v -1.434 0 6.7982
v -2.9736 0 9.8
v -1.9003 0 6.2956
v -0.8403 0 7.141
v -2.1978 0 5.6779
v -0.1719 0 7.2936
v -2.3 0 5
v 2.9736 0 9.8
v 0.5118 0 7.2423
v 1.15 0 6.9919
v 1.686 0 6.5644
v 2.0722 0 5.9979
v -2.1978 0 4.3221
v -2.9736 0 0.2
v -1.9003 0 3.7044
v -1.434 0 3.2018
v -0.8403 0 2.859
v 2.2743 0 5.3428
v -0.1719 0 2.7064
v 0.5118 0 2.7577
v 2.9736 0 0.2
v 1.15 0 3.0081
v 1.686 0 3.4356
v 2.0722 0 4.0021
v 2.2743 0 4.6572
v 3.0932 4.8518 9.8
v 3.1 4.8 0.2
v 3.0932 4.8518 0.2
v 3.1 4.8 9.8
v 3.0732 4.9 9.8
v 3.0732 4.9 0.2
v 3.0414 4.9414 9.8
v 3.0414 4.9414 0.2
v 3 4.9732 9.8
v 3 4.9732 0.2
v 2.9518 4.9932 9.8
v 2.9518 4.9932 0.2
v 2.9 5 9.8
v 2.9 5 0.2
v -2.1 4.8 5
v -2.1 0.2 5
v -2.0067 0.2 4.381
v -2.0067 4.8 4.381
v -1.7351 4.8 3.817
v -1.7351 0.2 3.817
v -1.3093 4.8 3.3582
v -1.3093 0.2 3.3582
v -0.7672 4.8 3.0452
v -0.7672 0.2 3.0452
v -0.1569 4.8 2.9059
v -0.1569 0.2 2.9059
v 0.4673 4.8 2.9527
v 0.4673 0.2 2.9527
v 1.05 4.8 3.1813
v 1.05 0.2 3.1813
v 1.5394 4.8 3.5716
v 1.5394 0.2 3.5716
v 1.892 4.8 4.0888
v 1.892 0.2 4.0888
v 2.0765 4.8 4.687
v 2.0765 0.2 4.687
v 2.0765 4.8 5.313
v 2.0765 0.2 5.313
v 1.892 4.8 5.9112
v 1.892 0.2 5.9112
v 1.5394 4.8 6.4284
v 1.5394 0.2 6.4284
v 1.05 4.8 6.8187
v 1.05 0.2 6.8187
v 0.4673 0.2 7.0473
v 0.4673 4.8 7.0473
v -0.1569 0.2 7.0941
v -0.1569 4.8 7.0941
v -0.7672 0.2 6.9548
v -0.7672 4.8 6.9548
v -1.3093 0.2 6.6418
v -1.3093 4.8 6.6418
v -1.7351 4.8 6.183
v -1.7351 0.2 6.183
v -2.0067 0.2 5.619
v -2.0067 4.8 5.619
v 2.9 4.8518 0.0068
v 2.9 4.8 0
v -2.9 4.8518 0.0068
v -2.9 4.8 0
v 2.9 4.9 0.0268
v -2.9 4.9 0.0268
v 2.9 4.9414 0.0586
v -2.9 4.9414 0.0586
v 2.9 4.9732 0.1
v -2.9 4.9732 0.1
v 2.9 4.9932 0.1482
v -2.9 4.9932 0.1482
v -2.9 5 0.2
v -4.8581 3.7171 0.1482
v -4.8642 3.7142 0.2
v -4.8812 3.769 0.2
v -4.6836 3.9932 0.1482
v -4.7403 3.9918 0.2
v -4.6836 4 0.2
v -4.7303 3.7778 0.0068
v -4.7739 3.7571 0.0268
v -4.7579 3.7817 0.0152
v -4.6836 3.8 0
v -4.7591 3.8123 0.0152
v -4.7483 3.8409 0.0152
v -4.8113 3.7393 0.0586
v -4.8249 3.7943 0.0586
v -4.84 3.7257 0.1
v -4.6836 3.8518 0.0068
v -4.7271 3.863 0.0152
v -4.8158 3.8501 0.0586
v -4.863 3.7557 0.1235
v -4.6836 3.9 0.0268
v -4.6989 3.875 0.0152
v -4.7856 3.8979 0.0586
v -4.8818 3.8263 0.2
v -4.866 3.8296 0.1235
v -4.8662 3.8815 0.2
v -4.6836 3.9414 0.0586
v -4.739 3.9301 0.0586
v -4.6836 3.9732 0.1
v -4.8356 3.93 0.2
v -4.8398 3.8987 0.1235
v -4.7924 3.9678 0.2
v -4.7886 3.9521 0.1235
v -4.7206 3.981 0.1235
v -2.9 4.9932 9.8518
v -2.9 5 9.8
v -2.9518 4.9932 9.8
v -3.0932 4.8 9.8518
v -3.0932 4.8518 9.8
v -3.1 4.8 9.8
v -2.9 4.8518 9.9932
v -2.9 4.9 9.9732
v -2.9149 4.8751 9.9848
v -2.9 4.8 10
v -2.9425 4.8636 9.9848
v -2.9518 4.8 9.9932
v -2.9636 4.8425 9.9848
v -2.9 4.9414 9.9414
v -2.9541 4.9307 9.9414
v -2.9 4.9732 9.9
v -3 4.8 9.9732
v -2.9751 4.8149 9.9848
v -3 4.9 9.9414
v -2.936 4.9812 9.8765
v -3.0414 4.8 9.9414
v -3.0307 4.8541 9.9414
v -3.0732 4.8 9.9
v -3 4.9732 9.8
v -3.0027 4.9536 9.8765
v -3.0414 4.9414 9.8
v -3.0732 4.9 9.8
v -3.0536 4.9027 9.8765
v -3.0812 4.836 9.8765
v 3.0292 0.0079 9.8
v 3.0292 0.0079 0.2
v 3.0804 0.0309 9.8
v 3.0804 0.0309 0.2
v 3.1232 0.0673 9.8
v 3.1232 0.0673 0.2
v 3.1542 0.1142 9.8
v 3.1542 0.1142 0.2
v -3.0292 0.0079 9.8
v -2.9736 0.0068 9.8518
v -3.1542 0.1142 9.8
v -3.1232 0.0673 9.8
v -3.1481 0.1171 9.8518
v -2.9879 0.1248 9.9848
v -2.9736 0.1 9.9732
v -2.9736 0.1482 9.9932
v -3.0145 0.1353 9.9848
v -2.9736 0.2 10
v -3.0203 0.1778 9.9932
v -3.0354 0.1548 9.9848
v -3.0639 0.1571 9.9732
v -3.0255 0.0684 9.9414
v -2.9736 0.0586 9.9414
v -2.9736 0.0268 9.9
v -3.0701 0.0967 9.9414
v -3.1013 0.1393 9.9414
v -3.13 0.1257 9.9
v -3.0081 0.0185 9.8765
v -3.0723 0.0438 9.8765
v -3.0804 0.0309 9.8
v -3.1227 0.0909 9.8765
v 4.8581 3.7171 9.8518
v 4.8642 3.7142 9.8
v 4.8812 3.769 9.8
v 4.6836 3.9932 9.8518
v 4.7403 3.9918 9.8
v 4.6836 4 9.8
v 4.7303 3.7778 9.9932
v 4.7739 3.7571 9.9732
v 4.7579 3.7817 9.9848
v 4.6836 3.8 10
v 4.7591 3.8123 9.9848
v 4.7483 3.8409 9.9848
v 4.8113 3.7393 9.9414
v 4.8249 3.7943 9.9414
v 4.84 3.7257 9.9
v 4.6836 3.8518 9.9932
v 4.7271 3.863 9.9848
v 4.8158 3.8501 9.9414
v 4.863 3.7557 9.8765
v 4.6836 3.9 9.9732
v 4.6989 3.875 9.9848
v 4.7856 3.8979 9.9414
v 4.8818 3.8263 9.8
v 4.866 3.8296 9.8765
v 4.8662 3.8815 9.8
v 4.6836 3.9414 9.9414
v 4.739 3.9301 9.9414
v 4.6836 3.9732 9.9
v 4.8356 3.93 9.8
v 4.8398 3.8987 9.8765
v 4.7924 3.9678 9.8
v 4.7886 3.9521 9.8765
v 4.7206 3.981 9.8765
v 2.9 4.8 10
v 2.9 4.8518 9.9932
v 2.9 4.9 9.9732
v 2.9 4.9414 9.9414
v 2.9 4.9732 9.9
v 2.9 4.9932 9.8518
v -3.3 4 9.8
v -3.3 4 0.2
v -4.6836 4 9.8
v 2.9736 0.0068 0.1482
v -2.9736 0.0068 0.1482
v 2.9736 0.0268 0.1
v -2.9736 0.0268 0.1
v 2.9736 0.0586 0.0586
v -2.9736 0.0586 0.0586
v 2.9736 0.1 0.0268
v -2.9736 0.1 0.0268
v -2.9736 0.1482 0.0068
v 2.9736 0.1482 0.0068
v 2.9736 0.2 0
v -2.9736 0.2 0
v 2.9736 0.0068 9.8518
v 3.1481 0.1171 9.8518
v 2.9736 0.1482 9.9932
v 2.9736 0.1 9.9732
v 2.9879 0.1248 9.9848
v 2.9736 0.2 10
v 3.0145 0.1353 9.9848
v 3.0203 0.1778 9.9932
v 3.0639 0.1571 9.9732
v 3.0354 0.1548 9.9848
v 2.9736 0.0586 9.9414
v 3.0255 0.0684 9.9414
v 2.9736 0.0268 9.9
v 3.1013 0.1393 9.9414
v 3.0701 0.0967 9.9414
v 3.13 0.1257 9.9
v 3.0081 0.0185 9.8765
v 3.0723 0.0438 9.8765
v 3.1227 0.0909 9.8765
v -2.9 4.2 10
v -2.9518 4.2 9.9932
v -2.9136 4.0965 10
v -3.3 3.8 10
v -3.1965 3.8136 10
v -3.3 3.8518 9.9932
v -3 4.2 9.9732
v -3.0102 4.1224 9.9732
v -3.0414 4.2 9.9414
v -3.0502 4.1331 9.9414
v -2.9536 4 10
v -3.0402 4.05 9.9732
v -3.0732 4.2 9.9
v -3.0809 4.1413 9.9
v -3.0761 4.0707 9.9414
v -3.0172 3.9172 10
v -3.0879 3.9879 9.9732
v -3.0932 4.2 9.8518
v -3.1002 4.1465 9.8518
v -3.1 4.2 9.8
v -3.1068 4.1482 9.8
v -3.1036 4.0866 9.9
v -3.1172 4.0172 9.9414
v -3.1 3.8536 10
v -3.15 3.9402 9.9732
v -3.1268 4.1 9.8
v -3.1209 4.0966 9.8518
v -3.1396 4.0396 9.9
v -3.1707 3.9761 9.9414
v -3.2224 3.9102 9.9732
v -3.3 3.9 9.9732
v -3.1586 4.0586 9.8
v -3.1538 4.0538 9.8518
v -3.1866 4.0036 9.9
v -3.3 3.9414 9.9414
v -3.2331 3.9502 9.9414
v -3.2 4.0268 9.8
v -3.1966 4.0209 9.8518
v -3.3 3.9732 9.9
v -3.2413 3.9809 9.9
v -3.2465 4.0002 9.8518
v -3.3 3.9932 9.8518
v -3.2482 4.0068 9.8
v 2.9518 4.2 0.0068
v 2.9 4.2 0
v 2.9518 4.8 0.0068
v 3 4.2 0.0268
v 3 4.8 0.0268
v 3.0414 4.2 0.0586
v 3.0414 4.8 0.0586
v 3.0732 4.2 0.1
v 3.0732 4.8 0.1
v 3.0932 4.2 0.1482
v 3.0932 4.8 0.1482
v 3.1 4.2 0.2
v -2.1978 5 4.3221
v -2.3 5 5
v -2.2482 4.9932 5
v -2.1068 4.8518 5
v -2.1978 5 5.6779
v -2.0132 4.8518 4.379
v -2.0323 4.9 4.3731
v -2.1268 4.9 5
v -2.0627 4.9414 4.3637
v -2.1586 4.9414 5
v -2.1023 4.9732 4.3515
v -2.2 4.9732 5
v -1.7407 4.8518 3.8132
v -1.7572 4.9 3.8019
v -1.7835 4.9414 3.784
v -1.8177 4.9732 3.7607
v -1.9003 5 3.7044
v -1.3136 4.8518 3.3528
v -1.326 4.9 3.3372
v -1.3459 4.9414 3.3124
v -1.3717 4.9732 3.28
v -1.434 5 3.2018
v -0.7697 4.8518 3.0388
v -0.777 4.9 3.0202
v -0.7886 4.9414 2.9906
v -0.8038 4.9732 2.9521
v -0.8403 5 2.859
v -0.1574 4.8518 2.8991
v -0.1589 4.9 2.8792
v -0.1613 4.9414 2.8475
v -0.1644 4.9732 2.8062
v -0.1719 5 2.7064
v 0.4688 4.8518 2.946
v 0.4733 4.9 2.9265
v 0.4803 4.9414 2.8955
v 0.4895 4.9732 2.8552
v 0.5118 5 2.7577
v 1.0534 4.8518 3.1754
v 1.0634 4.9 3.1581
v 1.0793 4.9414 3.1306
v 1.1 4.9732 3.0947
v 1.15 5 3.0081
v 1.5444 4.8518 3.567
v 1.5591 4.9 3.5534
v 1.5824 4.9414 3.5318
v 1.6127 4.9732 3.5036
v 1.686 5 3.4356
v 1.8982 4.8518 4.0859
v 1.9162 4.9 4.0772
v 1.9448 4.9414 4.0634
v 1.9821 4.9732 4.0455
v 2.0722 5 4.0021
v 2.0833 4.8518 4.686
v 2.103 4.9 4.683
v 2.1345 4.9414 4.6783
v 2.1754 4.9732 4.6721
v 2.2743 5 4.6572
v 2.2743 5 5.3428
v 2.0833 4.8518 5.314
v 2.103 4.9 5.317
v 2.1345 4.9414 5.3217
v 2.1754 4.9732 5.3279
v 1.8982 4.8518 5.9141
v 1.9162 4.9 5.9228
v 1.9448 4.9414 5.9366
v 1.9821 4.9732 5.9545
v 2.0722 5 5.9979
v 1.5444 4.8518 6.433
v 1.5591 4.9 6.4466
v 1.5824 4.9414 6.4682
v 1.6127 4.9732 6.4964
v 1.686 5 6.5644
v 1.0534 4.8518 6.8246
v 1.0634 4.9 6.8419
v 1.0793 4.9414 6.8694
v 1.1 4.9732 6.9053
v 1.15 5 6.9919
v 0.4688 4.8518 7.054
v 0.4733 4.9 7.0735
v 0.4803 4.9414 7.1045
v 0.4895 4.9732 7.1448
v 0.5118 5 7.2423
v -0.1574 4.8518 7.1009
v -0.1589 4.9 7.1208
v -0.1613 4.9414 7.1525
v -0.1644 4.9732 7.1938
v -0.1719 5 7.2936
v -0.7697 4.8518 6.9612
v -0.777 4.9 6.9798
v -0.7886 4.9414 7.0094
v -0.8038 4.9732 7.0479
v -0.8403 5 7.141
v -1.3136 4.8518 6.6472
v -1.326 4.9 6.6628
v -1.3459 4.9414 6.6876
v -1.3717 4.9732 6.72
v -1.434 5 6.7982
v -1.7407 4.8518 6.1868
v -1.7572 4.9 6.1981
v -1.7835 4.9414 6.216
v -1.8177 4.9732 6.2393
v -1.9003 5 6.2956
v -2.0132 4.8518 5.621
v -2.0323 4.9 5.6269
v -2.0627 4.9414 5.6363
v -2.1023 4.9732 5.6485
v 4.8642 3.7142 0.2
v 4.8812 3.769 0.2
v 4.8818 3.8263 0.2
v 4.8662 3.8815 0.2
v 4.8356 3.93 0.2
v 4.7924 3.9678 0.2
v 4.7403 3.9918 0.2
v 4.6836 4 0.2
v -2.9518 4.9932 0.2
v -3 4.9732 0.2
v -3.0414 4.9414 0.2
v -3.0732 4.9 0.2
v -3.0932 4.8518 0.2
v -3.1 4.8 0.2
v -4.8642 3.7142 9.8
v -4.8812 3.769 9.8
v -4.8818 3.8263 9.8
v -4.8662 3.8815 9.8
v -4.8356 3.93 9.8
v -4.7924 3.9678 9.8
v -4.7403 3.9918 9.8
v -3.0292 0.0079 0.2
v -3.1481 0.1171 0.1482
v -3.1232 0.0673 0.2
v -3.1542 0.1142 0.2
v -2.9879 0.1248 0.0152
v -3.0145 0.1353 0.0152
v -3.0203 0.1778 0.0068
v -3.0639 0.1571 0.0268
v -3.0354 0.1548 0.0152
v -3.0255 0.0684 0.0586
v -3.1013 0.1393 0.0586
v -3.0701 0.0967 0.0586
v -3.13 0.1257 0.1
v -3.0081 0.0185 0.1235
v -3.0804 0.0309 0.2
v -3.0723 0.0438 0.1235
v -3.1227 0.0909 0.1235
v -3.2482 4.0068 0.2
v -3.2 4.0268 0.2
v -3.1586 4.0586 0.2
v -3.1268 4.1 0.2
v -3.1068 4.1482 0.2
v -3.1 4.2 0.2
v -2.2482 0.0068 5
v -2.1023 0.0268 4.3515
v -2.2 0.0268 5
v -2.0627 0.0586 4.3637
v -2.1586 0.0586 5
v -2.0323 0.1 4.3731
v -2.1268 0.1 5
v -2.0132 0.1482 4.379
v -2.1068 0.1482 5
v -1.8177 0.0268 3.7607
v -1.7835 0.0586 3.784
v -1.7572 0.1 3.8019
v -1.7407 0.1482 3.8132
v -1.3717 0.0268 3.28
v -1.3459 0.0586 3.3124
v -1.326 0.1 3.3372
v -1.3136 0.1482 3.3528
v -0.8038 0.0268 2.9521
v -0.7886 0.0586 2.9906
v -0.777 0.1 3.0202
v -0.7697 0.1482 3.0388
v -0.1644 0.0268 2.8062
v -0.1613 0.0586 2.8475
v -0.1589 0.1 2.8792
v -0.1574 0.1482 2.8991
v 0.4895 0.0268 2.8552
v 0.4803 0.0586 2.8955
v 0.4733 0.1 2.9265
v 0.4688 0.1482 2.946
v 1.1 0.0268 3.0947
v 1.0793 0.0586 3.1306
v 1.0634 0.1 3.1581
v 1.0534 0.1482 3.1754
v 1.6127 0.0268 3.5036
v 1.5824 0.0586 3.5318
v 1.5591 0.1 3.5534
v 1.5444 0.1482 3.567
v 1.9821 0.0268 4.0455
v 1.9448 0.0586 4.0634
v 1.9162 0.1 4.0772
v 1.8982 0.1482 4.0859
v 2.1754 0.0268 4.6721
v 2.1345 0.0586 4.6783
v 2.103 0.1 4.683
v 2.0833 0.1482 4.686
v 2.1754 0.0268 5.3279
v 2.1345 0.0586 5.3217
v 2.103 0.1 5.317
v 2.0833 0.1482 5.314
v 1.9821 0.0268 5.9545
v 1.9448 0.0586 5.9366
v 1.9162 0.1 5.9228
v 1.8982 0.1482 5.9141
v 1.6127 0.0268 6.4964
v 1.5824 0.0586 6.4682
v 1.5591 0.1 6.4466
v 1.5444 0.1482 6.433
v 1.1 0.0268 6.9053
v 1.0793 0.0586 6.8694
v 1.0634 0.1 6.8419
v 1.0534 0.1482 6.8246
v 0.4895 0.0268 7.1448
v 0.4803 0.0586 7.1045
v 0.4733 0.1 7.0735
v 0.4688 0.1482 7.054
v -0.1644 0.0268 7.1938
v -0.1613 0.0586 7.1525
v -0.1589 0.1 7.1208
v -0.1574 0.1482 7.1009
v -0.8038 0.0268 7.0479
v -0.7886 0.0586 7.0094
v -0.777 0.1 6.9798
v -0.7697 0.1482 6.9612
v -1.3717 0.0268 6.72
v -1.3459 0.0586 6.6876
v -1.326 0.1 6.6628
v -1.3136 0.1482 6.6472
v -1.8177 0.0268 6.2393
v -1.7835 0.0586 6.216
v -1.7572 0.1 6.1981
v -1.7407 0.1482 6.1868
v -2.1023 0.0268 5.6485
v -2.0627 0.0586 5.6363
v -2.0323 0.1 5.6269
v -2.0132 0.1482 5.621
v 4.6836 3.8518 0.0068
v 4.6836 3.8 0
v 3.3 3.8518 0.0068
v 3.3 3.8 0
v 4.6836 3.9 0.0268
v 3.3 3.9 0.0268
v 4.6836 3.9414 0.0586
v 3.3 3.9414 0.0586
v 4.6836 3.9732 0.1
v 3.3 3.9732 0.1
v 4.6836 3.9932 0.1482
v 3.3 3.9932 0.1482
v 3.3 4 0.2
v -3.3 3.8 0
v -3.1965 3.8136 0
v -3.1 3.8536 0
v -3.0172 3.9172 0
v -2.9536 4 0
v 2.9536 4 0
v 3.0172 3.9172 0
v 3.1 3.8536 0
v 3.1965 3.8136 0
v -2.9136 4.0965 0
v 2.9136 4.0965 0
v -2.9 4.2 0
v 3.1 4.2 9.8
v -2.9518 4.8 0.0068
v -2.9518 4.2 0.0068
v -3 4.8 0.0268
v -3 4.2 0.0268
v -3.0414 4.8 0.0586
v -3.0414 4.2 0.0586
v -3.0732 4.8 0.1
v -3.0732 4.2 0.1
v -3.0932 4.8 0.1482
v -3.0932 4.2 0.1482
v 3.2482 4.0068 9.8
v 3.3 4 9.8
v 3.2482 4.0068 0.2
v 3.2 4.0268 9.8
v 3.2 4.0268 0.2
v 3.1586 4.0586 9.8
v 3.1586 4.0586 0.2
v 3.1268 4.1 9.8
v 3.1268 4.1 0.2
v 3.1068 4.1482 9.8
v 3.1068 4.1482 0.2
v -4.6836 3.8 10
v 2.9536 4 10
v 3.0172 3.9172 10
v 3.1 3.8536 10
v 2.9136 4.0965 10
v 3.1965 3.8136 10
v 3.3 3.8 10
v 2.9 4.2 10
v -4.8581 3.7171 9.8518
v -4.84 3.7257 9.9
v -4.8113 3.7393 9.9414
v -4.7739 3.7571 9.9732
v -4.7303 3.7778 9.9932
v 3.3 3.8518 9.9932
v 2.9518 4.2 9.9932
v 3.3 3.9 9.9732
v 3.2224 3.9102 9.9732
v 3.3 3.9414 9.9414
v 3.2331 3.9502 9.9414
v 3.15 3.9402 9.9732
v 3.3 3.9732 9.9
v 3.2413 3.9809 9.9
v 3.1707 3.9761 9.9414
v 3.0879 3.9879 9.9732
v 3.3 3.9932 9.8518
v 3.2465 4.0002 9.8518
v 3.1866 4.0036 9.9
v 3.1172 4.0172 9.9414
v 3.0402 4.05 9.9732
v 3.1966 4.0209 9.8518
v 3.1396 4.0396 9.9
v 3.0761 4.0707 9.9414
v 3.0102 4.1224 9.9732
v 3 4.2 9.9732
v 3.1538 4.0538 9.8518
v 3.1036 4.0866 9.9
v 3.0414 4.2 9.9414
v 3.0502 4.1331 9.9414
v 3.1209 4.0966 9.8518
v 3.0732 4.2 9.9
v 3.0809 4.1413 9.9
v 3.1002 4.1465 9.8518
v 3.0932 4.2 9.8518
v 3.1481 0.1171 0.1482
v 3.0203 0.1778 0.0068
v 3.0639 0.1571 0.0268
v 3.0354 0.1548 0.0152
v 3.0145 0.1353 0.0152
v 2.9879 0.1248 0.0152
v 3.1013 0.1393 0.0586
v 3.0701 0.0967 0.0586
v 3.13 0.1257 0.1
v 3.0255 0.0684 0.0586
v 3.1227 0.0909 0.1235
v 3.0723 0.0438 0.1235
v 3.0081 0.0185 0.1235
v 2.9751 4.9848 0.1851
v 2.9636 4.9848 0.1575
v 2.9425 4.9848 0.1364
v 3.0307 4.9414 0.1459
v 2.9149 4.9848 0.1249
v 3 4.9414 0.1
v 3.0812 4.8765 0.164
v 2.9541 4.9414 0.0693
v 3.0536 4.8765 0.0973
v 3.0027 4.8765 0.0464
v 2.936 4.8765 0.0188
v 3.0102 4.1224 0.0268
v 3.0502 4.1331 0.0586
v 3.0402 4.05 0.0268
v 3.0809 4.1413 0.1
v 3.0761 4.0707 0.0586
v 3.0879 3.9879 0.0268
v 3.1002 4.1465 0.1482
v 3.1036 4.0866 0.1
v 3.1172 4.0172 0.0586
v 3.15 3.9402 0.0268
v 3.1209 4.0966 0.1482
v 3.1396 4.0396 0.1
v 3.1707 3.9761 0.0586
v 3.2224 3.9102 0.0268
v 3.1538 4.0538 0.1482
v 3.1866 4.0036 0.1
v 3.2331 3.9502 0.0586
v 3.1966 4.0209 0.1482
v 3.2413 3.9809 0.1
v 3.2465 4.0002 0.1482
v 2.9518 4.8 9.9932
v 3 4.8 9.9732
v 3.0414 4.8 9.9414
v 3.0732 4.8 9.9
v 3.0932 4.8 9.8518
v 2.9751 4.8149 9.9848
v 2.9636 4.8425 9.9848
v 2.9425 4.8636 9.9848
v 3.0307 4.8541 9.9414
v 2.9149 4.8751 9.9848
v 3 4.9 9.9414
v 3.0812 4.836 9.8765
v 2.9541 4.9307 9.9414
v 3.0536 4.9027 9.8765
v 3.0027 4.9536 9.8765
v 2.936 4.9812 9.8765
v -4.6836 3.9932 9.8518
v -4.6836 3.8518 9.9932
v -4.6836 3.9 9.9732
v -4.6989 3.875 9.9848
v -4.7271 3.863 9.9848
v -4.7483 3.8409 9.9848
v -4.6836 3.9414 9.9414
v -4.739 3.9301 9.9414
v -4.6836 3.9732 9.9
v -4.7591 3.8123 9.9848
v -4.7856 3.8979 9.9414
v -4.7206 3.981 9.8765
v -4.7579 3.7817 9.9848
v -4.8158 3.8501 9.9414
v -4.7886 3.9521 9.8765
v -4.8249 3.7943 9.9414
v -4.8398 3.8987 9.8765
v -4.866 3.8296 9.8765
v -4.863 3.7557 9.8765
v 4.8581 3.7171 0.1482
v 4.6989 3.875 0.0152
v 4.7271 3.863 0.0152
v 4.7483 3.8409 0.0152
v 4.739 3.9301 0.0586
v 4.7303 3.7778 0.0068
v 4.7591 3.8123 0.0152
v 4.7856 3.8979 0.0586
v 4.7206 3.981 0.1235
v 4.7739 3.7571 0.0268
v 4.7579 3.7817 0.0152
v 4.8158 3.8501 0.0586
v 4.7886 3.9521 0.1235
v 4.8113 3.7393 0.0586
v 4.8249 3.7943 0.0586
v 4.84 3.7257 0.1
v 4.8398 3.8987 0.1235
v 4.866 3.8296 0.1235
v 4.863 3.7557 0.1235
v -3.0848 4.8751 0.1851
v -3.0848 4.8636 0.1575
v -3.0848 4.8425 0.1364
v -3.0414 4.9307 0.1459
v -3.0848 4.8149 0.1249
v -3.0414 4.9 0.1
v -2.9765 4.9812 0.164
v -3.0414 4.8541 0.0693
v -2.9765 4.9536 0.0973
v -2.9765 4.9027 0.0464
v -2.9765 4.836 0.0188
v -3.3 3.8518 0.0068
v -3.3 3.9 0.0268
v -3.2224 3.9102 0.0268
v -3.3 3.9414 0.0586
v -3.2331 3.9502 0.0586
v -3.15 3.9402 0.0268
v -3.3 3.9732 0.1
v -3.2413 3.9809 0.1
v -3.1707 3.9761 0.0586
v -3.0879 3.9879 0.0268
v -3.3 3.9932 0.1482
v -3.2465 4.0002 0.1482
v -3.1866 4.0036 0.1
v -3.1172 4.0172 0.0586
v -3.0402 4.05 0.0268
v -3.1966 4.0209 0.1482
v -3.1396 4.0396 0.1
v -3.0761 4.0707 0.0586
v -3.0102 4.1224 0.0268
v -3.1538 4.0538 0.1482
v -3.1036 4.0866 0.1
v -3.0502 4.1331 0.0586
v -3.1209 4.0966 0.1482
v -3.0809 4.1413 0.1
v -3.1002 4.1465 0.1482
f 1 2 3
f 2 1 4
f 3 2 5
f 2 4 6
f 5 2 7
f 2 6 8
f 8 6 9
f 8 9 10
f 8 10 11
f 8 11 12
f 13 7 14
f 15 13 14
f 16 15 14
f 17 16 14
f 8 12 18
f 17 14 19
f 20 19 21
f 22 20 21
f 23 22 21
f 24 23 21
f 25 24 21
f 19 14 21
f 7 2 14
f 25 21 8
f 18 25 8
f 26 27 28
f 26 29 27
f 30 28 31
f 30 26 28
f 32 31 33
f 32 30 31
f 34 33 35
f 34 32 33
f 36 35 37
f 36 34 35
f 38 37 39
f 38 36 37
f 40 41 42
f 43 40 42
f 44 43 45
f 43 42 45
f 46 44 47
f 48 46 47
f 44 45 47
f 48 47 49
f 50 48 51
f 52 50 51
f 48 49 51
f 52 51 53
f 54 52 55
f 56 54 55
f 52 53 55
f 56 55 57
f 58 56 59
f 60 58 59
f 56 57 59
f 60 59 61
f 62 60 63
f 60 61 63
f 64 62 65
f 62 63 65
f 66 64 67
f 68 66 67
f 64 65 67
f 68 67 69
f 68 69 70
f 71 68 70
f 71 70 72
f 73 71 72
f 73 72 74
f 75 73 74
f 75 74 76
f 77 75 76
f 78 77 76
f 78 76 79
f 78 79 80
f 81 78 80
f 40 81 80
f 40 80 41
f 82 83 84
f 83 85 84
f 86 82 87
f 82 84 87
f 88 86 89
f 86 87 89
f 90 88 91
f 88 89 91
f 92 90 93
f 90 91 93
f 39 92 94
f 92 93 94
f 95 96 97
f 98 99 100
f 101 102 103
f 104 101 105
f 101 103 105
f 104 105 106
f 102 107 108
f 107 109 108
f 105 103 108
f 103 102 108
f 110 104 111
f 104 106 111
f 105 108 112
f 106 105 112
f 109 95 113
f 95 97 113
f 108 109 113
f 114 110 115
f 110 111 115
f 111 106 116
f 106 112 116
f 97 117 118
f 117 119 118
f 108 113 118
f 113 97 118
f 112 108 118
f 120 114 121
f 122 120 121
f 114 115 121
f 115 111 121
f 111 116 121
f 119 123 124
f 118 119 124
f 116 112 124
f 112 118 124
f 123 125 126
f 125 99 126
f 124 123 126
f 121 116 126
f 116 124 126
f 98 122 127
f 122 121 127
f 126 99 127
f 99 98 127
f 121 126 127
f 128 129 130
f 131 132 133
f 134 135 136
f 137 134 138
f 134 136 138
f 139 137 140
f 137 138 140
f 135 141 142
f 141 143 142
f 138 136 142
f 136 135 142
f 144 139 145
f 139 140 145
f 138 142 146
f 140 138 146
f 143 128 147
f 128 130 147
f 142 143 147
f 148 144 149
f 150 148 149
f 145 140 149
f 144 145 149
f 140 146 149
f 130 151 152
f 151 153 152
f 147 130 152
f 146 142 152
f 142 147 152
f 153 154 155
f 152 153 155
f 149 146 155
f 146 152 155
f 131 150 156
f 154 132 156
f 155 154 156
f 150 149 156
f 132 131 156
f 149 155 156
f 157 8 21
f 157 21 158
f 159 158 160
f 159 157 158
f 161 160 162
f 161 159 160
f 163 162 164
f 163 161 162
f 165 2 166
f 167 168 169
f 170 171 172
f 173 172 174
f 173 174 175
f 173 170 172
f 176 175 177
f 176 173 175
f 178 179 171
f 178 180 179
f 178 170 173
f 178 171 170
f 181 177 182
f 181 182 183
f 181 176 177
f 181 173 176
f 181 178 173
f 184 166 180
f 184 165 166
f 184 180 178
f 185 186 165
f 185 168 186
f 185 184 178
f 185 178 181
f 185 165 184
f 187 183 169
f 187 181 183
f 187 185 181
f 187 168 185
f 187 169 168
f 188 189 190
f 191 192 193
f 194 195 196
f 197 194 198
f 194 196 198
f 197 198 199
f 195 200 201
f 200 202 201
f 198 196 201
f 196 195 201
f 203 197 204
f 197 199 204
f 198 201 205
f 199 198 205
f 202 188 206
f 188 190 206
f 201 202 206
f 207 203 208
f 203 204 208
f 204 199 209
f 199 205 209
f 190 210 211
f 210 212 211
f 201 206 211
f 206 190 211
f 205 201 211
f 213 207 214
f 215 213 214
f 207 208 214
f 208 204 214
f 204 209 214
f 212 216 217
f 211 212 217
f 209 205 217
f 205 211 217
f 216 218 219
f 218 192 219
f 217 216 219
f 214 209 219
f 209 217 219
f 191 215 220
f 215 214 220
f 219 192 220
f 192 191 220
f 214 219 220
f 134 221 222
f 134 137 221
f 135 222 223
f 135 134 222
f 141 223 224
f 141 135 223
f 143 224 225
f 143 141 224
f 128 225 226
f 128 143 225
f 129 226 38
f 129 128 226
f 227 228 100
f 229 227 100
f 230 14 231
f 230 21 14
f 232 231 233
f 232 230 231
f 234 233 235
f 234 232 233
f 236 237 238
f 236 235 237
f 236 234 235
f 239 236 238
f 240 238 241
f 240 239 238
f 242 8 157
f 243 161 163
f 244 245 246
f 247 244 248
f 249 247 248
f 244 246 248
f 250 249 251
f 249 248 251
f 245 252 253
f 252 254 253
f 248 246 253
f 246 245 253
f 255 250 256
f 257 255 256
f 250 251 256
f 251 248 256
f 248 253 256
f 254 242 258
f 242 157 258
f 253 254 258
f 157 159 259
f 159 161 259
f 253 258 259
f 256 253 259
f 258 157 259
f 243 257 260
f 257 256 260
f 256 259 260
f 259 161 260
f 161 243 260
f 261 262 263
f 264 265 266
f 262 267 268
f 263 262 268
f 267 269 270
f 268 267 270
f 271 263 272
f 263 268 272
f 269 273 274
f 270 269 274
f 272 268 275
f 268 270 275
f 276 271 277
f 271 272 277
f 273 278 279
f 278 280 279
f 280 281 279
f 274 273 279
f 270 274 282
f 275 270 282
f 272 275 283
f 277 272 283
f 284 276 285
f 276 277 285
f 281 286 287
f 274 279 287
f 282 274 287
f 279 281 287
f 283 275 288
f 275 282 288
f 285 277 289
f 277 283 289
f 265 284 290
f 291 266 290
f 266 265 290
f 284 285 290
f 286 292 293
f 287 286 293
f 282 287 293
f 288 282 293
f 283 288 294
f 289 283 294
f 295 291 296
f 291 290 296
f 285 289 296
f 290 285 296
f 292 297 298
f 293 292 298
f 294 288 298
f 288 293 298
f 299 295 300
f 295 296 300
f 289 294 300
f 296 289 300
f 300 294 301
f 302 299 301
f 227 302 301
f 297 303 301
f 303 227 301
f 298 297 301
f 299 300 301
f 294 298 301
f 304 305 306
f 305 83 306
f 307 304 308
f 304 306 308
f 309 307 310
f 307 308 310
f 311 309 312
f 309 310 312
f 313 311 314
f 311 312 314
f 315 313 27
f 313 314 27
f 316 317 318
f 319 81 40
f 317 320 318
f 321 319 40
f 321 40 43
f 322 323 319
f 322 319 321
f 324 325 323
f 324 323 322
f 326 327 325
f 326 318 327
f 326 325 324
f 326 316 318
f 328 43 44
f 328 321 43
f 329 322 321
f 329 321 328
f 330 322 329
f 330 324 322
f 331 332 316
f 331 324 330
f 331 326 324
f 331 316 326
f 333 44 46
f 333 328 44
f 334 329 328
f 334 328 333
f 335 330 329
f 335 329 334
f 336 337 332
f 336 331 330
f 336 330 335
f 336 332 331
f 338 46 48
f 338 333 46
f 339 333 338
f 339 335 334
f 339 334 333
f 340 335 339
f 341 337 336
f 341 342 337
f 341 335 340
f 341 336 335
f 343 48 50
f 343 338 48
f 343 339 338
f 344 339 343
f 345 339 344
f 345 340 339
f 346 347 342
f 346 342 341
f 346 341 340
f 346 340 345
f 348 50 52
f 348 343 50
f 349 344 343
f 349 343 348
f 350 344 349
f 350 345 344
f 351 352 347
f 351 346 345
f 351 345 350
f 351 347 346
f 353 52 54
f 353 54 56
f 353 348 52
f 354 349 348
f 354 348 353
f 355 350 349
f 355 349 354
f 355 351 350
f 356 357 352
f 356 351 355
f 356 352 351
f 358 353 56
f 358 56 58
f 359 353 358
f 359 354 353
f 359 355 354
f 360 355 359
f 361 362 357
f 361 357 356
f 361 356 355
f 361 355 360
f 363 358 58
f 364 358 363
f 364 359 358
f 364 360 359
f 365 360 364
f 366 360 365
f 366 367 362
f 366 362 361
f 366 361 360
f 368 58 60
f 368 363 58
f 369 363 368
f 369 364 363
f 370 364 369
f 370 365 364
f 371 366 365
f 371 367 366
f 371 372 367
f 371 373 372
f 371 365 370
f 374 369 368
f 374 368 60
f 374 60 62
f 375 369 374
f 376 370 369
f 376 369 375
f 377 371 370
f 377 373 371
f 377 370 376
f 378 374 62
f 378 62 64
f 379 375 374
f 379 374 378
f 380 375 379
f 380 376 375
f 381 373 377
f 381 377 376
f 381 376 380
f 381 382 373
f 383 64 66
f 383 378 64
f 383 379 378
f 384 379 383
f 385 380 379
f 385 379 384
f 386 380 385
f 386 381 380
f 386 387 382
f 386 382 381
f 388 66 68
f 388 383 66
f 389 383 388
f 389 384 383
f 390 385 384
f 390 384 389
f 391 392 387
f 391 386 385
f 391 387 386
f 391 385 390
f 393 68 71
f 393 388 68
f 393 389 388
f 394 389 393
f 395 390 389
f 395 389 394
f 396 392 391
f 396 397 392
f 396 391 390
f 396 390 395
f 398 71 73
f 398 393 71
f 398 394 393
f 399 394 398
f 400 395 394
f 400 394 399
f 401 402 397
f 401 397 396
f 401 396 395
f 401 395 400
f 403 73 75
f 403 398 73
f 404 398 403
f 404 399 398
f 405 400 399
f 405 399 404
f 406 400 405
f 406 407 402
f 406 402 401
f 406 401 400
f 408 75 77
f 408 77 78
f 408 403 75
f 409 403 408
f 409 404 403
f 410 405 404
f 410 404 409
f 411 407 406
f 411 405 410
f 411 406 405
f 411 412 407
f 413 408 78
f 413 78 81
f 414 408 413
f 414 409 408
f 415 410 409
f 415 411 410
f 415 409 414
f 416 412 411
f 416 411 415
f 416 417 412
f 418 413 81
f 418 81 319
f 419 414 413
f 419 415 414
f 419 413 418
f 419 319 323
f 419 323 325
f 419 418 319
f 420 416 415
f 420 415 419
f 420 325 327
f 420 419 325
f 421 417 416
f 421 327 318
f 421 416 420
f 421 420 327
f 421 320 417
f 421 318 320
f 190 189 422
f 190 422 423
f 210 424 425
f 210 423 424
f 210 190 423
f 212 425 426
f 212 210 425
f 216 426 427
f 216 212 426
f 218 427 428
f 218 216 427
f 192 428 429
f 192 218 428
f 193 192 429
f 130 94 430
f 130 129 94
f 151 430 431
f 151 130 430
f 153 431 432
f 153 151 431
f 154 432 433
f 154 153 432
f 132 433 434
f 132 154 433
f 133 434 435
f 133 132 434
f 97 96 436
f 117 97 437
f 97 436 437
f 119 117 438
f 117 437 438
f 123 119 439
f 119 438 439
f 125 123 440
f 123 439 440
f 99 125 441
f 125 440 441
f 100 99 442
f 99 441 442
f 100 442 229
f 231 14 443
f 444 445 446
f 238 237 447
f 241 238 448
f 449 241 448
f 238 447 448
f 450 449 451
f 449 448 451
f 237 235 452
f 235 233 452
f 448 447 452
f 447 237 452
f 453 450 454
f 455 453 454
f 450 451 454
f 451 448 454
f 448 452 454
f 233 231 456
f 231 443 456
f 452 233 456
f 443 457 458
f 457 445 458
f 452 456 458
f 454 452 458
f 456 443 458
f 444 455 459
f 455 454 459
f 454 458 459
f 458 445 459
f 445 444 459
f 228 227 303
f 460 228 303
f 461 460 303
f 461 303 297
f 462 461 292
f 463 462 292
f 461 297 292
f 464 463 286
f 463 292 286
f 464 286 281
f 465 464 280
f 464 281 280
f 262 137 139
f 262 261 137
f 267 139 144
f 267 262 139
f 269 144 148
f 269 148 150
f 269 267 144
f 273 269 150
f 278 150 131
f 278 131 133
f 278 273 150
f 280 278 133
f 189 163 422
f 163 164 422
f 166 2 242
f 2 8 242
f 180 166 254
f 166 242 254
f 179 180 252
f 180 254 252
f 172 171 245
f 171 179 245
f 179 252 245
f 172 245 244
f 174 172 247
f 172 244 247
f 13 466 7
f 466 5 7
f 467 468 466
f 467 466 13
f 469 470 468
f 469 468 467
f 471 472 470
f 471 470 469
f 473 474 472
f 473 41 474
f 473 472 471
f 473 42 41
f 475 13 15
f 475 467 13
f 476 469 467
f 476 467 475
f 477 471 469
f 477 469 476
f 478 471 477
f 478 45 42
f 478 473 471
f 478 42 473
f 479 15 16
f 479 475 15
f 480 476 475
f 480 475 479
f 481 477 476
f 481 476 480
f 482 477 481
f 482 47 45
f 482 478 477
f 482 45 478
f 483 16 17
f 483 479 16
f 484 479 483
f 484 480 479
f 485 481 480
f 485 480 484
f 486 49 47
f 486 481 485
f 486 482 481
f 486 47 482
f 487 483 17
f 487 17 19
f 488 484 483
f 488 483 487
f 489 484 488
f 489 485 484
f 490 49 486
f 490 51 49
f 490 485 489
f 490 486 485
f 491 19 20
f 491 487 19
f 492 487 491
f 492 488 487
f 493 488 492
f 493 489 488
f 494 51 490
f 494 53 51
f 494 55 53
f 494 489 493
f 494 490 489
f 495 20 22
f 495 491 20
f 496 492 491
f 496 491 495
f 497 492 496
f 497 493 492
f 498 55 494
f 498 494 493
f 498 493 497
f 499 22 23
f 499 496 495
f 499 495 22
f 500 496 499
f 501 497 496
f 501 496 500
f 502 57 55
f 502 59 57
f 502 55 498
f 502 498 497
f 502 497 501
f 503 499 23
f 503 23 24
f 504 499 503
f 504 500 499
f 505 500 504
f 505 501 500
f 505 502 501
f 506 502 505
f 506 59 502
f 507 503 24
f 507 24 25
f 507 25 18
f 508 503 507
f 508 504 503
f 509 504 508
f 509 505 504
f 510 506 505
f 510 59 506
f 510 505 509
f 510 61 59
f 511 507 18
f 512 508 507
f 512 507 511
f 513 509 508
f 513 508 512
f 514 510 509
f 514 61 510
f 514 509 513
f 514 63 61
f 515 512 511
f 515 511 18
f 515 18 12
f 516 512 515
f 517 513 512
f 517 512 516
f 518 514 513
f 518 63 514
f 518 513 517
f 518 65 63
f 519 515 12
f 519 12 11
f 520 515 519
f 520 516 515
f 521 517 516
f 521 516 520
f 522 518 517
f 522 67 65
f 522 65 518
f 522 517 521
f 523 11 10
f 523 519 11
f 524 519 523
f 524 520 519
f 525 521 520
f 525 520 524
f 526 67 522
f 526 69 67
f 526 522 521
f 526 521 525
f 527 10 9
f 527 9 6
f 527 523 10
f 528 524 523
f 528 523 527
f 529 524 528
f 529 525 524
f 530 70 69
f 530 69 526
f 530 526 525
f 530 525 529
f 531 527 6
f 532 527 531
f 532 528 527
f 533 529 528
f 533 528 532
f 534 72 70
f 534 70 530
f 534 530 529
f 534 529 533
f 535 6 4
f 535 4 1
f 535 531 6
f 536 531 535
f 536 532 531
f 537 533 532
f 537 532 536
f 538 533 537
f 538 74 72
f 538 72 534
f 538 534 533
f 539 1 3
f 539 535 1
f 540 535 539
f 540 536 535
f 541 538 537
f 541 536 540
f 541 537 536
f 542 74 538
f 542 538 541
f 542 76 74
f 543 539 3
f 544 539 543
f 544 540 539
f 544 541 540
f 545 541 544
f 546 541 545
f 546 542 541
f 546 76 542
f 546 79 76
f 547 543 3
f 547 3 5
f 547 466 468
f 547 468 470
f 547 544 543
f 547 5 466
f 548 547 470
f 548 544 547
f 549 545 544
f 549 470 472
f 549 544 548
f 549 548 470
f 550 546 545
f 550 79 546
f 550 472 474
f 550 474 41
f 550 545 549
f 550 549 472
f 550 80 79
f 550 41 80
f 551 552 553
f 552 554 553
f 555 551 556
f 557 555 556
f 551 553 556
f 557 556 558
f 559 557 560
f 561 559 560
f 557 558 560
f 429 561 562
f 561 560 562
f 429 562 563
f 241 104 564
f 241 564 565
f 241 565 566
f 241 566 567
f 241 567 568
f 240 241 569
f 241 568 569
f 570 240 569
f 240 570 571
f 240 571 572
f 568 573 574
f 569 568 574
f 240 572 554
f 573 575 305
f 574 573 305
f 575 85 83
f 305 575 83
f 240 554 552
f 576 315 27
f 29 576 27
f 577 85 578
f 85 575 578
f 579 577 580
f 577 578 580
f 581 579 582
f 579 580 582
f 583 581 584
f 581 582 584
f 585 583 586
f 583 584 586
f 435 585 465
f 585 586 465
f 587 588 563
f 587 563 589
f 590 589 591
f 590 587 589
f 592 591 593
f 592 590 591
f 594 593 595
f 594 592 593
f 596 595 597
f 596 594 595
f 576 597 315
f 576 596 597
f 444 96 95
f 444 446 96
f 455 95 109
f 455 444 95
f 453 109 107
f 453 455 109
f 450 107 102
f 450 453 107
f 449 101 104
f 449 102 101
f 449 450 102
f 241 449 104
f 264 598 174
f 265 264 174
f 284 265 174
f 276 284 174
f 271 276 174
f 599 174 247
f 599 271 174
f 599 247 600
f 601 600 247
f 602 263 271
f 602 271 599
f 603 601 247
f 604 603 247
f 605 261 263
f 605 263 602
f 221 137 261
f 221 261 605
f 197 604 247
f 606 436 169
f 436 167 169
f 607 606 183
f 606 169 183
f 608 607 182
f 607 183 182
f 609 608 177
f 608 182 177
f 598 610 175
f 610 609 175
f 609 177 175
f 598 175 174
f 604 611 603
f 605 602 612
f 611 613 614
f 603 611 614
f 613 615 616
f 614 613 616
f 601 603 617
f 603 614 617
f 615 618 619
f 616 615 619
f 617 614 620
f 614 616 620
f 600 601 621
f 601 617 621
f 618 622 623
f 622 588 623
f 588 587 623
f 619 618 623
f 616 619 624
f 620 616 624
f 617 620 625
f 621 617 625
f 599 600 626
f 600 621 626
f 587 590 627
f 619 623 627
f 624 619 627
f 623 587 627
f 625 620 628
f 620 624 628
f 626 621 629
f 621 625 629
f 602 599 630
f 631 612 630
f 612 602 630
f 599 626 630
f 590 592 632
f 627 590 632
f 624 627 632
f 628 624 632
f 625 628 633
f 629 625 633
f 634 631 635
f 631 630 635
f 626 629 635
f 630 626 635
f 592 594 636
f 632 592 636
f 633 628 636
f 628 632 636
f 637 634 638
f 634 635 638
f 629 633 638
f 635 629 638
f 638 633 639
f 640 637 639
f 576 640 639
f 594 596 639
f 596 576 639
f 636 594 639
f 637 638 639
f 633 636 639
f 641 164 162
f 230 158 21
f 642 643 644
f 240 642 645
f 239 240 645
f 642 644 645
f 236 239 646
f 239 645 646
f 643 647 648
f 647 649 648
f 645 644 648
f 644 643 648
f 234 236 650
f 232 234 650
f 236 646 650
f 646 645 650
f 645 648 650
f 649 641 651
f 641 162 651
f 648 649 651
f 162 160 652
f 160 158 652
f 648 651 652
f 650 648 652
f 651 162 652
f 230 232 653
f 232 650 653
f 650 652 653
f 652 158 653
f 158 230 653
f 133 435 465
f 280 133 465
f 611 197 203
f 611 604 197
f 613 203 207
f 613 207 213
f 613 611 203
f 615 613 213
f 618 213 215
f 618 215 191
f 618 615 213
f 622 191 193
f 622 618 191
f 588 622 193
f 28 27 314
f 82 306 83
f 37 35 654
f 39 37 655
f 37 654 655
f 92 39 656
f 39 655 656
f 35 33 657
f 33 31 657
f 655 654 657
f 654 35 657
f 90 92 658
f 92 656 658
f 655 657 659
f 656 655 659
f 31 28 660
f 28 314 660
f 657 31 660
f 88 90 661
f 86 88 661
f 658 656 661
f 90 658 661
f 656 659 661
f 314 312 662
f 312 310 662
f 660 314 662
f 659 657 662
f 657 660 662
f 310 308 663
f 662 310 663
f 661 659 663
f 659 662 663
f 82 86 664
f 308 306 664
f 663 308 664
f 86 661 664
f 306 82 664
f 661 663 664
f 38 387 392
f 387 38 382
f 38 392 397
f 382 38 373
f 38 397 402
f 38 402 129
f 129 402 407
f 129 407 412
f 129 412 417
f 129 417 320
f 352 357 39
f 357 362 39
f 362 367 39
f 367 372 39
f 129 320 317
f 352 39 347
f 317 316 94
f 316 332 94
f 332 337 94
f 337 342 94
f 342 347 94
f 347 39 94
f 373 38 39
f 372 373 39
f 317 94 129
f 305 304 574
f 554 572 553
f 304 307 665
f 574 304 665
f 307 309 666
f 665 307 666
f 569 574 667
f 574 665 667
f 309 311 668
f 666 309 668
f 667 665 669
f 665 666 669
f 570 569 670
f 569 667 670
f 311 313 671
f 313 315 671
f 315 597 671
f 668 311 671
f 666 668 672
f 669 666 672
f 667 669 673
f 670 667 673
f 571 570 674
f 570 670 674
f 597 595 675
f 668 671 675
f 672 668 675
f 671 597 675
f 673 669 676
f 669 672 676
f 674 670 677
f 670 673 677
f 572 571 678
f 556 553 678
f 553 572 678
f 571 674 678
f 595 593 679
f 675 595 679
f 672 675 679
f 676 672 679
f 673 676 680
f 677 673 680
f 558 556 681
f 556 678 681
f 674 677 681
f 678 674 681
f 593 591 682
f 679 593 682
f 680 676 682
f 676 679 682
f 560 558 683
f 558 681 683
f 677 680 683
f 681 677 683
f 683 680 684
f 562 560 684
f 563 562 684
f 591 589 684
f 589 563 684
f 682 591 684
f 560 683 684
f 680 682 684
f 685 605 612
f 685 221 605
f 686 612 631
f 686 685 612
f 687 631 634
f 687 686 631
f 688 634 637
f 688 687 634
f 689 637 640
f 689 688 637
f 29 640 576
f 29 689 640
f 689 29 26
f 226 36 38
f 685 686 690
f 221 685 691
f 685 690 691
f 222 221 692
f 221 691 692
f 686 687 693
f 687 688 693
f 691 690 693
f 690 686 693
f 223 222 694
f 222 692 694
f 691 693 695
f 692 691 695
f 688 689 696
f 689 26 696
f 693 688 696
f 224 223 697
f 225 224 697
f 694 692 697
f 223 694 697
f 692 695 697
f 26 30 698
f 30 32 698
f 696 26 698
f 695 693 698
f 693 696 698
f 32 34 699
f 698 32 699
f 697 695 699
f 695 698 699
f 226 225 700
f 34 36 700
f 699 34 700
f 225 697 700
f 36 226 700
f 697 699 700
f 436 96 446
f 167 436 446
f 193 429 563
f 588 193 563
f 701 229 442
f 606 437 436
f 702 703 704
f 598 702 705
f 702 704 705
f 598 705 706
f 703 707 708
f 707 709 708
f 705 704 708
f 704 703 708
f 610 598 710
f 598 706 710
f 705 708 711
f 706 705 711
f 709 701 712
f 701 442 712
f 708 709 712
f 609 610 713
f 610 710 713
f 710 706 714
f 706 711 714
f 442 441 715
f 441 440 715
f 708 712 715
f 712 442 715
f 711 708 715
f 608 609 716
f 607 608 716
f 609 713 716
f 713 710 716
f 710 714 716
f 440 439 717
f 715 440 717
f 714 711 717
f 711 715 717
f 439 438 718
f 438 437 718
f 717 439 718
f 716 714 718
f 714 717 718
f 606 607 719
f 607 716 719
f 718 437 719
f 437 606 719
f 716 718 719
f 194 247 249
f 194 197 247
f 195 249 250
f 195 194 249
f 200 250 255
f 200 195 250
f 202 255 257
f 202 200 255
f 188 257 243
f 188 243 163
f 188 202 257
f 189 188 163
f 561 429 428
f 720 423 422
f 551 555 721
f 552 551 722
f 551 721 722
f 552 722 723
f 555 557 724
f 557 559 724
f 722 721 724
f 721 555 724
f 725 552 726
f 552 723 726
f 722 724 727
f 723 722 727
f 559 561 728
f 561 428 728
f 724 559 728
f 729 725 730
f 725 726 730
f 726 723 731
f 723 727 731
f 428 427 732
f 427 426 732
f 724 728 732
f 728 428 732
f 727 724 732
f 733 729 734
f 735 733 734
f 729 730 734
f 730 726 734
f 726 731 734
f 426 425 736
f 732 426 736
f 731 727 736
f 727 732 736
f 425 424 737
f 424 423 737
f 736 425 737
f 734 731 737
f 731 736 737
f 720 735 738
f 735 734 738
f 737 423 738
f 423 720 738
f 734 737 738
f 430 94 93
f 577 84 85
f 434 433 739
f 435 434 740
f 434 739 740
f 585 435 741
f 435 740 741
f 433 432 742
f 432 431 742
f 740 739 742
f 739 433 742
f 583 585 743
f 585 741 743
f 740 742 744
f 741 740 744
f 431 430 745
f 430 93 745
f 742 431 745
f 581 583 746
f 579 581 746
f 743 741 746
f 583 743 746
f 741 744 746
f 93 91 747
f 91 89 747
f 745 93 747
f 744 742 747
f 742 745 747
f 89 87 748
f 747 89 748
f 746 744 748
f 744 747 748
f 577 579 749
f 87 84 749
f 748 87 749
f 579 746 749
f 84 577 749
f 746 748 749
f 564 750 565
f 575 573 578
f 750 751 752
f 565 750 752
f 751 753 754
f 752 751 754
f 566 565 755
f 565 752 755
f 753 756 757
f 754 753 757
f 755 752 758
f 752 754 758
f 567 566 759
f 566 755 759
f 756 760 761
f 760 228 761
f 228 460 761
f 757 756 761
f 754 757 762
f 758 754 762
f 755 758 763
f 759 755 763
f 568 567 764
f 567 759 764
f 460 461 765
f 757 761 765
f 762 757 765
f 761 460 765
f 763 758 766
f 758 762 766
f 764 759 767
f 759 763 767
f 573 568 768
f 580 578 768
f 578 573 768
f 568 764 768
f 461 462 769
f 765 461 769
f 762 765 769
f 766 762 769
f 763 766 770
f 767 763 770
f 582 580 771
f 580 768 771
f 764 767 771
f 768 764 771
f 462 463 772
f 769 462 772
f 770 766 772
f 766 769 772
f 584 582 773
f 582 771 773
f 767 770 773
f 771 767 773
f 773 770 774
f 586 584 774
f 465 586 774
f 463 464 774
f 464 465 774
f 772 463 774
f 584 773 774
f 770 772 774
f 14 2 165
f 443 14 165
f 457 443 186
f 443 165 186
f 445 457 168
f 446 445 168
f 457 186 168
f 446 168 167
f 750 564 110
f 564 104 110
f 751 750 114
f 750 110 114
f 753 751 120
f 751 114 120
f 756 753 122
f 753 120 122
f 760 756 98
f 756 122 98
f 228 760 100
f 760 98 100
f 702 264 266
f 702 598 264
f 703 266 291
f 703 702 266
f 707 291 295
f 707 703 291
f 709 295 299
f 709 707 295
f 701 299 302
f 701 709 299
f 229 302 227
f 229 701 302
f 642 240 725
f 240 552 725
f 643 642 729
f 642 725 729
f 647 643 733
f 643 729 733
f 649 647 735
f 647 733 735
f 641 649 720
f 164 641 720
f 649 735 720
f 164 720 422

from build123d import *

# Parameters (mm, degrees)
NUTEXTRUSION_DEPTH    = 10
M5X0_8_TAPPED_HOLE1_D = 4.2
FILLET1_R             = 0.2


with BuildPart() as part:
    # MainSketch → NutExtrusion (new body)
    with BuildSketch(Plane.XY):
        Polygon((-3.1, 0), (3.1, 0), (5, 4), (3.1, 4), (3.1, 5), (-3.1, 5), (-3.1, 4), (-5, 4), align=None)
    extrude(amount=NUTEXTRUSION_DEPTH)

    # M5x0.8 Tapped Hole1 (through all)
    with Locations(Plane(origin=(0, 5, 0), x_dir=(1, 0, 0), z_dir=(0, 1, 0))):
        with Locations((0, -5)):
            Hole(M5X0_8_TAPPED_HOLE1_D / 2)

    # Fillet1
    fillet1_edges = [part.edges().sort_by_distance(p)[0] for p in [
        (4.05, 4, 0),
        (3.1, 4, 5),
        (3.1, 4.5, 0),
        (3.1, 5, 5),
        (0, 5, 0),
        (-3.1, 5, 5),
        (-3.1, 4.5, 0),
        (2.1, 5, 5),
        (2.1, 0, 5),
        (-3.1, 4, 5),
        (-4.05, 4, 0),
        (-5, 4, 5),
        (-4.05, 2, 0),
        (-3.1, 0, 5),
        (0, 0, 0),
        (0, 0, 10),
        (4.05, 2, 10),
        (4.05, 4, 10),
        (3.1, 4.5, 10),
        (0, 5, 10),
        (-3.1, 4.5, 10),
        (-4.05, 4, 10),
        (-4.05, 2, 10),
        (3.1, 0, 5),
        (4.05, 2, 0),
        (5, 4, 5),
    ]]
    fillet(fillet1_edges, radius=FILLET1_R)


solid = part.part
